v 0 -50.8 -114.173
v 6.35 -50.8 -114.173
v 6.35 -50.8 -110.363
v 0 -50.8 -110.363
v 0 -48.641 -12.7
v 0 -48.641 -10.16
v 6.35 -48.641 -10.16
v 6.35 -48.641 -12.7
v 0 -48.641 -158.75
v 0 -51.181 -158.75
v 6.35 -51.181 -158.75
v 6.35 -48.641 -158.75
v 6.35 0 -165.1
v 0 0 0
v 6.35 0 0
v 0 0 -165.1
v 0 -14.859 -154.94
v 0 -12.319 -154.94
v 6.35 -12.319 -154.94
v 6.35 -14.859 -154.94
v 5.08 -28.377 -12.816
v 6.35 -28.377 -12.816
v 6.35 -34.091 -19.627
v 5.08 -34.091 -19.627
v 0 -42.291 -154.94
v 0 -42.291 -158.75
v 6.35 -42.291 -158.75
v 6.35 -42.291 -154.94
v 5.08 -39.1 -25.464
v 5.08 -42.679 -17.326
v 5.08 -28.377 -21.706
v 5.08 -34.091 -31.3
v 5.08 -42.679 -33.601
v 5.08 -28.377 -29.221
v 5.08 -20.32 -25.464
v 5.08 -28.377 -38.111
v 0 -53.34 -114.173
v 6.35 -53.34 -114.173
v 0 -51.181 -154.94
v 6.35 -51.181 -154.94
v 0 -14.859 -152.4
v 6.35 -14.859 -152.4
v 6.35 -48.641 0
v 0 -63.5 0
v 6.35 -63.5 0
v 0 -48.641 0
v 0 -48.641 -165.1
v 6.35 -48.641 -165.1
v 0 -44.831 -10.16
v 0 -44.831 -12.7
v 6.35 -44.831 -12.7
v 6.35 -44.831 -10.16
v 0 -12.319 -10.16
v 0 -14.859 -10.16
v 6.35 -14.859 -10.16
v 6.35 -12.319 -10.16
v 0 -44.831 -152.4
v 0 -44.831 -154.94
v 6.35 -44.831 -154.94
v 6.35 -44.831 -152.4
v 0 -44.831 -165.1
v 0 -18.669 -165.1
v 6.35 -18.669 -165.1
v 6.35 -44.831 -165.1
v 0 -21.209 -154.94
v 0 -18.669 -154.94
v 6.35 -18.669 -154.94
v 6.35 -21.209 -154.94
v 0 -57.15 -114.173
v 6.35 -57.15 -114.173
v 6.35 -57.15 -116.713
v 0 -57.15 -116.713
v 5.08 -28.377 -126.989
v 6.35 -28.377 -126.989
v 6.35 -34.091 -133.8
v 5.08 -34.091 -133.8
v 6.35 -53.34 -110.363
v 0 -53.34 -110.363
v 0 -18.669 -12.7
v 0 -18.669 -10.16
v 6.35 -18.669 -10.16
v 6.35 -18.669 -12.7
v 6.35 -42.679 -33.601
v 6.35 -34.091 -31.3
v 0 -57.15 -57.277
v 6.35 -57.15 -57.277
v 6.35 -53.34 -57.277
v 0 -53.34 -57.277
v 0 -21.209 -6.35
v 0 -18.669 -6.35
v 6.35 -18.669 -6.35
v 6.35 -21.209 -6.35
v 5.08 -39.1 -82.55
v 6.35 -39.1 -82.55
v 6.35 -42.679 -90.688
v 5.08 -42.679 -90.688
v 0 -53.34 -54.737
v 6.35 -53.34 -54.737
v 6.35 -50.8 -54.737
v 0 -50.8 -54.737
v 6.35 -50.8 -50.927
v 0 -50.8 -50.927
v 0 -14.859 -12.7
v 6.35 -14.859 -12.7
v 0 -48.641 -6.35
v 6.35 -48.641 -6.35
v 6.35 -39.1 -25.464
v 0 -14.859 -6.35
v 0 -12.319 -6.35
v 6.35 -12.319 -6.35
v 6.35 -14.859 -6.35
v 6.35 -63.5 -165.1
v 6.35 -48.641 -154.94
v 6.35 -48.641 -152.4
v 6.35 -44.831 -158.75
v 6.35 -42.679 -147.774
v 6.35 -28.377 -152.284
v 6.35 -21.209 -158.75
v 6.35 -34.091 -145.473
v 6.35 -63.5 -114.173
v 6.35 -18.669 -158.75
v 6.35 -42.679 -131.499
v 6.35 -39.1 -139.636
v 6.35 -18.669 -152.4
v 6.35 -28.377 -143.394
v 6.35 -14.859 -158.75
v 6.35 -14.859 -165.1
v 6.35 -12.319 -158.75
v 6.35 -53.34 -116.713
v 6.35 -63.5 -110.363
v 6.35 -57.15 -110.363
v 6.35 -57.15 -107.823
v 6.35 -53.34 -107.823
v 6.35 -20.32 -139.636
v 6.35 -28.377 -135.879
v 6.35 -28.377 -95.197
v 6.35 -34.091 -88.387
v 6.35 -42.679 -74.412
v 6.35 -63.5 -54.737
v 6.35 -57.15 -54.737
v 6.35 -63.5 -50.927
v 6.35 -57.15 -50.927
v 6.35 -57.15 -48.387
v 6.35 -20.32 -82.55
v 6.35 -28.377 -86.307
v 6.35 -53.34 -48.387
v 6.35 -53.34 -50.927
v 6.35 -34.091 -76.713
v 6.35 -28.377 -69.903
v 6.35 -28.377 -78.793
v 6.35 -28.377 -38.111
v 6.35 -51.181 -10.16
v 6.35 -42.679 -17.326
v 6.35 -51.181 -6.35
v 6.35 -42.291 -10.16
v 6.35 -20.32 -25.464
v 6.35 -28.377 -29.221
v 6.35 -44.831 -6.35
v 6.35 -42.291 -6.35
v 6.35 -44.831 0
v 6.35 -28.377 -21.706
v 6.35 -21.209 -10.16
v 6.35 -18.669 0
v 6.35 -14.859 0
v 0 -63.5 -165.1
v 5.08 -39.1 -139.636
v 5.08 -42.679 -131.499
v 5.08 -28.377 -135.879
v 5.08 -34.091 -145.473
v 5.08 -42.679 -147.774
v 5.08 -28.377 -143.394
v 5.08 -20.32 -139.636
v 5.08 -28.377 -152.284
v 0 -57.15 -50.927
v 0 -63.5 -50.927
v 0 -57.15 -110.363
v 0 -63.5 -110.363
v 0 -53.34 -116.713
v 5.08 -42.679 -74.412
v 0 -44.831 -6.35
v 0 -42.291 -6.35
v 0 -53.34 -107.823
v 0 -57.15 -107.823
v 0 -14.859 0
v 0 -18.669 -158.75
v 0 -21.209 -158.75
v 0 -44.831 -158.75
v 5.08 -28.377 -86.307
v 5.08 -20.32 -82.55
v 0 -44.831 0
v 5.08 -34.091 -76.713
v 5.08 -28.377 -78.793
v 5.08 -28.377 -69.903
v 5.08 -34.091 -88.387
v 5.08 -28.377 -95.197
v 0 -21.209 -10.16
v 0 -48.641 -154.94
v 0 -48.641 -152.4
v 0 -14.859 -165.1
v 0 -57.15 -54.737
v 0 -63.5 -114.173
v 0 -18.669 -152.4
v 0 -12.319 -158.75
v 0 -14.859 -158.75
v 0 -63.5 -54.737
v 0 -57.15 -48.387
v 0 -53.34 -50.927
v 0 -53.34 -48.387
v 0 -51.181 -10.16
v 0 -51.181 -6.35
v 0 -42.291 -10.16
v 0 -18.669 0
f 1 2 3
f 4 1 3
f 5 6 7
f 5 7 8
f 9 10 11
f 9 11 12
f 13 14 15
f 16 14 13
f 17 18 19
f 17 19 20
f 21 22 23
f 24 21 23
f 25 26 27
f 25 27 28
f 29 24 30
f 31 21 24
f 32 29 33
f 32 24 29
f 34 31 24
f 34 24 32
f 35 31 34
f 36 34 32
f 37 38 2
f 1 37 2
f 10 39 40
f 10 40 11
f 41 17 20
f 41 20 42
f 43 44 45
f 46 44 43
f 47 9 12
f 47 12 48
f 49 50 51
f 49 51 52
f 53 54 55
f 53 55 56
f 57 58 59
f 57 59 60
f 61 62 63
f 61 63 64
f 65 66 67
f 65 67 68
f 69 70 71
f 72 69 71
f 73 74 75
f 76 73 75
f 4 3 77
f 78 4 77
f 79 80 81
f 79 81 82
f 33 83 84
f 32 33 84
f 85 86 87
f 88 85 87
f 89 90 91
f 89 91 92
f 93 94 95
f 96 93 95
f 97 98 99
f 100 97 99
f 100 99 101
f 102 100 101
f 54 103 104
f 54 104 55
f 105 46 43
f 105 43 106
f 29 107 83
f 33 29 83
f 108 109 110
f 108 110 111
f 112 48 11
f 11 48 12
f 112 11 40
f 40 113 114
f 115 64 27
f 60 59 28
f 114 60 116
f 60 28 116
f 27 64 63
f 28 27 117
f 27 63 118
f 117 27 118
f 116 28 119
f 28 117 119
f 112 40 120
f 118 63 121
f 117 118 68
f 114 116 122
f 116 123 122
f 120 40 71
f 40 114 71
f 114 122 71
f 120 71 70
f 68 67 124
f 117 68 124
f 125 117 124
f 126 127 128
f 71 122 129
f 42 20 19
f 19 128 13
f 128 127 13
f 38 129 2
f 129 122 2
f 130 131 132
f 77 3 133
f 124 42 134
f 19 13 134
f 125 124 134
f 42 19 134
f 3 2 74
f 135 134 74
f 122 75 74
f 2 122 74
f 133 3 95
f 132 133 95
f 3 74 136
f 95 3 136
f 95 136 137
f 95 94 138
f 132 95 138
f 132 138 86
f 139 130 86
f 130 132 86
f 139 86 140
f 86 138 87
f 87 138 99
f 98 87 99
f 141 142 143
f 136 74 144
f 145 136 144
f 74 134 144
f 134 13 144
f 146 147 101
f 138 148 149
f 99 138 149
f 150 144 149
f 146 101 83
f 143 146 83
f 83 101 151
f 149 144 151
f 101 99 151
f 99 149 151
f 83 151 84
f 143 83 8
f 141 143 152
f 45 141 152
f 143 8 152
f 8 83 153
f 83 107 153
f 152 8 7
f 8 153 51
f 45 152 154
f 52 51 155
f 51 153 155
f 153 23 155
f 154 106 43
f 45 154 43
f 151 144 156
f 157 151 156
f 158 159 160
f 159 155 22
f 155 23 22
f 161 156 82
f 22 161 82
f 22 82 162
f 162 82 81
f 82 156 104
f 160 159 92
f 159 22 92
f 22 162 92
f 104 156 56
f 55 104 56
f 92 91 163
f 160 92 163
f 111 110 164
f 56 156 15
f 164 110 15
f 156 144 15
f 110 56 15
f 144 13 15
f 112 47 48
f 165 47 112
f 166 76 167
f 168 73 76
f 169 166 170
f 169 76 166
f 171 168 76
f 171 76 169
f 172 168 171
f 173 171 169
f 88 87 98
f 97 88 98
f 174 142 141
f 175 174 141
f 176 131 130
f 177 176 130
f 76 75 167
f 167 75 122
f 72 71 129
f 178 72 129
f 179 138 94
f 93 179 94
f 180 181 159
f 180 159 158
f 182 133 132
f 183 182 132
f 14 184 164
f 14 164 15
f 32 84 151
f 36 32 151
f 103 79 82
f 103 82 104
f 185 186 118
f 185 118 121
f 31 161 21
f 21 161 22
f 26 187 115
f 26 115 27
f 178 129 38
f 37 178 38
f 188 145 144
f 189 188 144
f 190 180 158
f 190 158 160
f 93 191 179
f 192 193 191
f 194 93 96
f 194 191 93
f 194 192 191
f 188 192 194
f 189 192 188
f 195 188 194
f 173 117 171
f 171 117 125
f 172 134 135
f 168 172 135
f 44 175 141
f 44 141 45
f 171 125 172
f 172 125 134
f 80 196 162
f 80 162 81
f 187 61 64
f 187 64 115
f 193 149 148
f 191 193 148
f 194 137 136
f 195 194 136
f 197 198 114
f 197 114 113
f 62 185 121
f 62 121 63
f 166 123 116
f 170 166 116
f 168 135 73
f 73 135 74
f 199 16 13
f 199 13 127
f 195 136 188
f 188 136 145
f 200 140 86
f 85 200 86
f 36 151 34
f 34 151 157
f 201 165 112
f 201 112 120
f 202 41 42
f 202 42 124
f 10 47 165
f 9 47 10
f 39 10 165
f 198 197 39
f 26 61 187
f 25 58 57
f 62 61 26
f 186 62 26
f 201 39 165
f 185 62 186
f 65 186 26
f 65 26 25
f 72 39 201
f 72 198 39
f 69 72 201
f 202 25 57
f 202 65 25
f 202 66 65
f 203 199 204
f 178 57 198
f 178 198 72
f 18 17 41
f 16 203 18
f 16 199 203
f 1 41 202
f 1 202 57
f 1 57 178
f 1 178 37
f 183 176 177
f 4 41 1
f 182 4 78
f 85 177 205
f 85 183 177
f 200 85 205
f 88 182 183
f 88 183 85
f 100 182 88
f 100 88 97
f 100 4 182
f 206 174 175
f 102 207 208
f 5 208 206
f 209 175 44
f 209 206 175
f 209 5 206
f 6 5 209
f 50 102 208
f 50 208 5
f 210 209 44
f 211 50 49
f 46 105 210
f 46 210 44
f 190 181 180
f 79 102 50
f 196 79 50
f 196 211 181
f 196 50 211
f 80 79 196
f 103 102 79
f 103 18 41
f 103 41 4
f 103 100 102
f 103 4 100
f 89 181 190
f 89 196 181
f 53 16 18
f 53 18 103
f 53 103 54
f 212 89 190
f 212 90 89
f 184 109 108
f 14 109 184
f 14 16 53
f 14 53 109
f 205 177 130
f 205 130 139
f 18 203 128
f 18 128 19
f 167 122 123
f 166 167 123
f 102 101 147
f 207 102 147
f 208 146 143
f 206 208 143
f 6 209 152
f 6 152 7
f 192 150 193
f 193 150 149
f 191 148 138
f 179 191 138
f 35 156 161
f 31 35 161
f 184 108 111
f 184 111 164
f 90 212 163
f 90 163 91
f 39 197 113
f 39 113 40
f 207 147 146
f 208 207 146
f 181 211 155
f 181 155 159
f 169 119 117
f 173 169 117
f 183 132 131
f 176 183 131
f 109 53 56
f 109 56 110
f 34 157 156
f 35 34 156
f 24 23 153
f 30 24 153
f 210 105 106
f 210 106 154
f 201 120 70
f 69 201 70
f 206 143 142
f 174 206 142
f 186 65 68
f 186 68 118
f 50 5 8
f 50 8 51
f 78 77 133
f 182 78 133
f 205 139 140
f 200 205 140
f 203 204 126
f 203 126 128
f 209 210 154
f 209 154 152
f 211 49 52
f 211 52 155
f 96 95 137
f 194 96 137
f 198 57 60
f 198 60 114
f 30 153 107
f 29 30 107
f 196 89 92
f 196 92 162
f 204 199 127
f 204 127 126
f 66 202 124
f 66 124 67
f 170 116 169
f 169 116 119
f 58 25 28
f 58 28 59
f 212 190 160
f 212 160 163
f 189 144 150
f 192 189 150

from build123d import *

# Parameters (mm, degrees)
BOSS_EXTRUDE1_DEPTH = 6.35
CUT_EXTRUDE1_DEPTH  = 178.004470283
CUT_EXTRUDE2_DEPTH  = 1.27


with BuildPart() as part:
    # Sketch1 → Boss-Extrude1 (new body)
    with BuildSketch(Plane(origin=(0, 0, 0), x_dir=(0, 0, -1), z_dir=(1, 0, 0))):
        Polygon((0, 0), (165.1, 0), (165.1, -14.859), (158.75, -14.859), (158.75, -12.319), (154.94, -12.319), (154.94, -14.859), (152.4, -14.859), (152.4, -18.669), (154.94, -18.669), (154.94, -21.209), (158.75, -21.209), (158.75, -18.669), (165.1, -18.669), (165.1, -44.831), (158.75, -44.831), (158.75, -42.291), (154.94, -42.291), (154.94, -44.831), (152.4, -44.831), (152.4, -48.641), (154.94, -48.641), (154.94, -51.181), (158.75, -51.181), (158.75, -48.641), (165.1, -48.641), (165.1, -63.5), (0, -63.5), (0, -48.641), (6.35, -48.641), (6.35, -51.181), (10.16, -51.181), (10.16, -48.641), (12.7, -48.641), (12.7, -44.831), (10.16, -44.831), (10.16, -42.291), (6.35, -42.291), (6.35, -44.831), (0, -44.831), (0, -18.669), (6.35, -18.669), (6.35, -21.209), (10.16, -21.209), (10.16, -18.669), (12.7, -18.669), (12.7, -14.859), (10.16, -14.859), (10.16, -12.319), (6.35, -12.319), (6.35, -14.859), (0, -14.859), align=None)
    extrude(amount=BOSS_EXTRUDE1_DEPTH)

    # Sketch2 → Cut-Extrude1 (cut, through all)
    with BuildSketch(Plane(origin=(6.35, 0, 0), x_dir=(0, 0, -1), z_dir=(1, 0, 0))):
        Polygon((50.927, -63.5), (54.737, -63.5), (54.737, -57.15), (57.277, -57.15), (57.277, -53.34), (54.737, -53.34), (54.737, -50.8), (50.927, -50.8), (50.927, -53.34), (48.387, -53.34), (48.387, -57.15), (50.927, -57.15), align=None)
        Polygon((110.363, -63.5), (114.173, -63.5), (114.173, -57.15), (116.713, -57.15), (116.713, -53.34), (114.173, -53.34), (114.173, -50.8), (110.363, -50.8), (110.363, -53.34), (107.823, -53.34), (107.823, -57.15), (110.363, -57.15), align=None)
    extrude(amount=-CUT_EXTRUDE1_DEPTH, mode=Mode.SUBTRACT)

    # Sketch3 → Cut-Extrude2 (cut)
    with BuildSketch(Plane(origin=(6.35, 0, 0), x_dir=(0, 0, -1), z_dir=(1, 0, 0))):
        Polygon((82.55, -20.32), (78.792923653, -28.377076227), (69.902923653, -28.377076227), (76.713058752, -34.091458077), (74.412157441, -42.678538673), (82.55, -39.09976535), (90.687842559, -42.678538673), (88.386941248, -34.091458077), (95.197076347, -28.377076227), (86.307076347, -28.377076227), align=None)
        Polygon((25.4635, -20.32), (21.706423653, -28.377076227), (12.816423653, -28.377076227), (19.626558752, -34.091458077), (17.325657441, -42.678538673), (25.4635, -39.09976535), (33.601342559, -42.678538673), (31.300441248, -34.091458077), (38.110576347, -28.377076227), (29.220576347, -28.377076227), align=None)
        Polygon((139.6365, -20.32), (135.879423653, -28.377076227), (126.989423653, -28.377076227), (133.799558752, -34.091458077), (131.498657441, -42.678538673), (139.6365, -39.09976535), (147.774342559, -42.678538673), (145.473441248, -34.091458077), (152.283576347, -28.377076227), (143.393576347, -28.377076227), align=None)
    extrude(amount=-CUT_EXTRUDE2_DEPTH, mode=Mode.SUBTRACT)


solid = part.part
